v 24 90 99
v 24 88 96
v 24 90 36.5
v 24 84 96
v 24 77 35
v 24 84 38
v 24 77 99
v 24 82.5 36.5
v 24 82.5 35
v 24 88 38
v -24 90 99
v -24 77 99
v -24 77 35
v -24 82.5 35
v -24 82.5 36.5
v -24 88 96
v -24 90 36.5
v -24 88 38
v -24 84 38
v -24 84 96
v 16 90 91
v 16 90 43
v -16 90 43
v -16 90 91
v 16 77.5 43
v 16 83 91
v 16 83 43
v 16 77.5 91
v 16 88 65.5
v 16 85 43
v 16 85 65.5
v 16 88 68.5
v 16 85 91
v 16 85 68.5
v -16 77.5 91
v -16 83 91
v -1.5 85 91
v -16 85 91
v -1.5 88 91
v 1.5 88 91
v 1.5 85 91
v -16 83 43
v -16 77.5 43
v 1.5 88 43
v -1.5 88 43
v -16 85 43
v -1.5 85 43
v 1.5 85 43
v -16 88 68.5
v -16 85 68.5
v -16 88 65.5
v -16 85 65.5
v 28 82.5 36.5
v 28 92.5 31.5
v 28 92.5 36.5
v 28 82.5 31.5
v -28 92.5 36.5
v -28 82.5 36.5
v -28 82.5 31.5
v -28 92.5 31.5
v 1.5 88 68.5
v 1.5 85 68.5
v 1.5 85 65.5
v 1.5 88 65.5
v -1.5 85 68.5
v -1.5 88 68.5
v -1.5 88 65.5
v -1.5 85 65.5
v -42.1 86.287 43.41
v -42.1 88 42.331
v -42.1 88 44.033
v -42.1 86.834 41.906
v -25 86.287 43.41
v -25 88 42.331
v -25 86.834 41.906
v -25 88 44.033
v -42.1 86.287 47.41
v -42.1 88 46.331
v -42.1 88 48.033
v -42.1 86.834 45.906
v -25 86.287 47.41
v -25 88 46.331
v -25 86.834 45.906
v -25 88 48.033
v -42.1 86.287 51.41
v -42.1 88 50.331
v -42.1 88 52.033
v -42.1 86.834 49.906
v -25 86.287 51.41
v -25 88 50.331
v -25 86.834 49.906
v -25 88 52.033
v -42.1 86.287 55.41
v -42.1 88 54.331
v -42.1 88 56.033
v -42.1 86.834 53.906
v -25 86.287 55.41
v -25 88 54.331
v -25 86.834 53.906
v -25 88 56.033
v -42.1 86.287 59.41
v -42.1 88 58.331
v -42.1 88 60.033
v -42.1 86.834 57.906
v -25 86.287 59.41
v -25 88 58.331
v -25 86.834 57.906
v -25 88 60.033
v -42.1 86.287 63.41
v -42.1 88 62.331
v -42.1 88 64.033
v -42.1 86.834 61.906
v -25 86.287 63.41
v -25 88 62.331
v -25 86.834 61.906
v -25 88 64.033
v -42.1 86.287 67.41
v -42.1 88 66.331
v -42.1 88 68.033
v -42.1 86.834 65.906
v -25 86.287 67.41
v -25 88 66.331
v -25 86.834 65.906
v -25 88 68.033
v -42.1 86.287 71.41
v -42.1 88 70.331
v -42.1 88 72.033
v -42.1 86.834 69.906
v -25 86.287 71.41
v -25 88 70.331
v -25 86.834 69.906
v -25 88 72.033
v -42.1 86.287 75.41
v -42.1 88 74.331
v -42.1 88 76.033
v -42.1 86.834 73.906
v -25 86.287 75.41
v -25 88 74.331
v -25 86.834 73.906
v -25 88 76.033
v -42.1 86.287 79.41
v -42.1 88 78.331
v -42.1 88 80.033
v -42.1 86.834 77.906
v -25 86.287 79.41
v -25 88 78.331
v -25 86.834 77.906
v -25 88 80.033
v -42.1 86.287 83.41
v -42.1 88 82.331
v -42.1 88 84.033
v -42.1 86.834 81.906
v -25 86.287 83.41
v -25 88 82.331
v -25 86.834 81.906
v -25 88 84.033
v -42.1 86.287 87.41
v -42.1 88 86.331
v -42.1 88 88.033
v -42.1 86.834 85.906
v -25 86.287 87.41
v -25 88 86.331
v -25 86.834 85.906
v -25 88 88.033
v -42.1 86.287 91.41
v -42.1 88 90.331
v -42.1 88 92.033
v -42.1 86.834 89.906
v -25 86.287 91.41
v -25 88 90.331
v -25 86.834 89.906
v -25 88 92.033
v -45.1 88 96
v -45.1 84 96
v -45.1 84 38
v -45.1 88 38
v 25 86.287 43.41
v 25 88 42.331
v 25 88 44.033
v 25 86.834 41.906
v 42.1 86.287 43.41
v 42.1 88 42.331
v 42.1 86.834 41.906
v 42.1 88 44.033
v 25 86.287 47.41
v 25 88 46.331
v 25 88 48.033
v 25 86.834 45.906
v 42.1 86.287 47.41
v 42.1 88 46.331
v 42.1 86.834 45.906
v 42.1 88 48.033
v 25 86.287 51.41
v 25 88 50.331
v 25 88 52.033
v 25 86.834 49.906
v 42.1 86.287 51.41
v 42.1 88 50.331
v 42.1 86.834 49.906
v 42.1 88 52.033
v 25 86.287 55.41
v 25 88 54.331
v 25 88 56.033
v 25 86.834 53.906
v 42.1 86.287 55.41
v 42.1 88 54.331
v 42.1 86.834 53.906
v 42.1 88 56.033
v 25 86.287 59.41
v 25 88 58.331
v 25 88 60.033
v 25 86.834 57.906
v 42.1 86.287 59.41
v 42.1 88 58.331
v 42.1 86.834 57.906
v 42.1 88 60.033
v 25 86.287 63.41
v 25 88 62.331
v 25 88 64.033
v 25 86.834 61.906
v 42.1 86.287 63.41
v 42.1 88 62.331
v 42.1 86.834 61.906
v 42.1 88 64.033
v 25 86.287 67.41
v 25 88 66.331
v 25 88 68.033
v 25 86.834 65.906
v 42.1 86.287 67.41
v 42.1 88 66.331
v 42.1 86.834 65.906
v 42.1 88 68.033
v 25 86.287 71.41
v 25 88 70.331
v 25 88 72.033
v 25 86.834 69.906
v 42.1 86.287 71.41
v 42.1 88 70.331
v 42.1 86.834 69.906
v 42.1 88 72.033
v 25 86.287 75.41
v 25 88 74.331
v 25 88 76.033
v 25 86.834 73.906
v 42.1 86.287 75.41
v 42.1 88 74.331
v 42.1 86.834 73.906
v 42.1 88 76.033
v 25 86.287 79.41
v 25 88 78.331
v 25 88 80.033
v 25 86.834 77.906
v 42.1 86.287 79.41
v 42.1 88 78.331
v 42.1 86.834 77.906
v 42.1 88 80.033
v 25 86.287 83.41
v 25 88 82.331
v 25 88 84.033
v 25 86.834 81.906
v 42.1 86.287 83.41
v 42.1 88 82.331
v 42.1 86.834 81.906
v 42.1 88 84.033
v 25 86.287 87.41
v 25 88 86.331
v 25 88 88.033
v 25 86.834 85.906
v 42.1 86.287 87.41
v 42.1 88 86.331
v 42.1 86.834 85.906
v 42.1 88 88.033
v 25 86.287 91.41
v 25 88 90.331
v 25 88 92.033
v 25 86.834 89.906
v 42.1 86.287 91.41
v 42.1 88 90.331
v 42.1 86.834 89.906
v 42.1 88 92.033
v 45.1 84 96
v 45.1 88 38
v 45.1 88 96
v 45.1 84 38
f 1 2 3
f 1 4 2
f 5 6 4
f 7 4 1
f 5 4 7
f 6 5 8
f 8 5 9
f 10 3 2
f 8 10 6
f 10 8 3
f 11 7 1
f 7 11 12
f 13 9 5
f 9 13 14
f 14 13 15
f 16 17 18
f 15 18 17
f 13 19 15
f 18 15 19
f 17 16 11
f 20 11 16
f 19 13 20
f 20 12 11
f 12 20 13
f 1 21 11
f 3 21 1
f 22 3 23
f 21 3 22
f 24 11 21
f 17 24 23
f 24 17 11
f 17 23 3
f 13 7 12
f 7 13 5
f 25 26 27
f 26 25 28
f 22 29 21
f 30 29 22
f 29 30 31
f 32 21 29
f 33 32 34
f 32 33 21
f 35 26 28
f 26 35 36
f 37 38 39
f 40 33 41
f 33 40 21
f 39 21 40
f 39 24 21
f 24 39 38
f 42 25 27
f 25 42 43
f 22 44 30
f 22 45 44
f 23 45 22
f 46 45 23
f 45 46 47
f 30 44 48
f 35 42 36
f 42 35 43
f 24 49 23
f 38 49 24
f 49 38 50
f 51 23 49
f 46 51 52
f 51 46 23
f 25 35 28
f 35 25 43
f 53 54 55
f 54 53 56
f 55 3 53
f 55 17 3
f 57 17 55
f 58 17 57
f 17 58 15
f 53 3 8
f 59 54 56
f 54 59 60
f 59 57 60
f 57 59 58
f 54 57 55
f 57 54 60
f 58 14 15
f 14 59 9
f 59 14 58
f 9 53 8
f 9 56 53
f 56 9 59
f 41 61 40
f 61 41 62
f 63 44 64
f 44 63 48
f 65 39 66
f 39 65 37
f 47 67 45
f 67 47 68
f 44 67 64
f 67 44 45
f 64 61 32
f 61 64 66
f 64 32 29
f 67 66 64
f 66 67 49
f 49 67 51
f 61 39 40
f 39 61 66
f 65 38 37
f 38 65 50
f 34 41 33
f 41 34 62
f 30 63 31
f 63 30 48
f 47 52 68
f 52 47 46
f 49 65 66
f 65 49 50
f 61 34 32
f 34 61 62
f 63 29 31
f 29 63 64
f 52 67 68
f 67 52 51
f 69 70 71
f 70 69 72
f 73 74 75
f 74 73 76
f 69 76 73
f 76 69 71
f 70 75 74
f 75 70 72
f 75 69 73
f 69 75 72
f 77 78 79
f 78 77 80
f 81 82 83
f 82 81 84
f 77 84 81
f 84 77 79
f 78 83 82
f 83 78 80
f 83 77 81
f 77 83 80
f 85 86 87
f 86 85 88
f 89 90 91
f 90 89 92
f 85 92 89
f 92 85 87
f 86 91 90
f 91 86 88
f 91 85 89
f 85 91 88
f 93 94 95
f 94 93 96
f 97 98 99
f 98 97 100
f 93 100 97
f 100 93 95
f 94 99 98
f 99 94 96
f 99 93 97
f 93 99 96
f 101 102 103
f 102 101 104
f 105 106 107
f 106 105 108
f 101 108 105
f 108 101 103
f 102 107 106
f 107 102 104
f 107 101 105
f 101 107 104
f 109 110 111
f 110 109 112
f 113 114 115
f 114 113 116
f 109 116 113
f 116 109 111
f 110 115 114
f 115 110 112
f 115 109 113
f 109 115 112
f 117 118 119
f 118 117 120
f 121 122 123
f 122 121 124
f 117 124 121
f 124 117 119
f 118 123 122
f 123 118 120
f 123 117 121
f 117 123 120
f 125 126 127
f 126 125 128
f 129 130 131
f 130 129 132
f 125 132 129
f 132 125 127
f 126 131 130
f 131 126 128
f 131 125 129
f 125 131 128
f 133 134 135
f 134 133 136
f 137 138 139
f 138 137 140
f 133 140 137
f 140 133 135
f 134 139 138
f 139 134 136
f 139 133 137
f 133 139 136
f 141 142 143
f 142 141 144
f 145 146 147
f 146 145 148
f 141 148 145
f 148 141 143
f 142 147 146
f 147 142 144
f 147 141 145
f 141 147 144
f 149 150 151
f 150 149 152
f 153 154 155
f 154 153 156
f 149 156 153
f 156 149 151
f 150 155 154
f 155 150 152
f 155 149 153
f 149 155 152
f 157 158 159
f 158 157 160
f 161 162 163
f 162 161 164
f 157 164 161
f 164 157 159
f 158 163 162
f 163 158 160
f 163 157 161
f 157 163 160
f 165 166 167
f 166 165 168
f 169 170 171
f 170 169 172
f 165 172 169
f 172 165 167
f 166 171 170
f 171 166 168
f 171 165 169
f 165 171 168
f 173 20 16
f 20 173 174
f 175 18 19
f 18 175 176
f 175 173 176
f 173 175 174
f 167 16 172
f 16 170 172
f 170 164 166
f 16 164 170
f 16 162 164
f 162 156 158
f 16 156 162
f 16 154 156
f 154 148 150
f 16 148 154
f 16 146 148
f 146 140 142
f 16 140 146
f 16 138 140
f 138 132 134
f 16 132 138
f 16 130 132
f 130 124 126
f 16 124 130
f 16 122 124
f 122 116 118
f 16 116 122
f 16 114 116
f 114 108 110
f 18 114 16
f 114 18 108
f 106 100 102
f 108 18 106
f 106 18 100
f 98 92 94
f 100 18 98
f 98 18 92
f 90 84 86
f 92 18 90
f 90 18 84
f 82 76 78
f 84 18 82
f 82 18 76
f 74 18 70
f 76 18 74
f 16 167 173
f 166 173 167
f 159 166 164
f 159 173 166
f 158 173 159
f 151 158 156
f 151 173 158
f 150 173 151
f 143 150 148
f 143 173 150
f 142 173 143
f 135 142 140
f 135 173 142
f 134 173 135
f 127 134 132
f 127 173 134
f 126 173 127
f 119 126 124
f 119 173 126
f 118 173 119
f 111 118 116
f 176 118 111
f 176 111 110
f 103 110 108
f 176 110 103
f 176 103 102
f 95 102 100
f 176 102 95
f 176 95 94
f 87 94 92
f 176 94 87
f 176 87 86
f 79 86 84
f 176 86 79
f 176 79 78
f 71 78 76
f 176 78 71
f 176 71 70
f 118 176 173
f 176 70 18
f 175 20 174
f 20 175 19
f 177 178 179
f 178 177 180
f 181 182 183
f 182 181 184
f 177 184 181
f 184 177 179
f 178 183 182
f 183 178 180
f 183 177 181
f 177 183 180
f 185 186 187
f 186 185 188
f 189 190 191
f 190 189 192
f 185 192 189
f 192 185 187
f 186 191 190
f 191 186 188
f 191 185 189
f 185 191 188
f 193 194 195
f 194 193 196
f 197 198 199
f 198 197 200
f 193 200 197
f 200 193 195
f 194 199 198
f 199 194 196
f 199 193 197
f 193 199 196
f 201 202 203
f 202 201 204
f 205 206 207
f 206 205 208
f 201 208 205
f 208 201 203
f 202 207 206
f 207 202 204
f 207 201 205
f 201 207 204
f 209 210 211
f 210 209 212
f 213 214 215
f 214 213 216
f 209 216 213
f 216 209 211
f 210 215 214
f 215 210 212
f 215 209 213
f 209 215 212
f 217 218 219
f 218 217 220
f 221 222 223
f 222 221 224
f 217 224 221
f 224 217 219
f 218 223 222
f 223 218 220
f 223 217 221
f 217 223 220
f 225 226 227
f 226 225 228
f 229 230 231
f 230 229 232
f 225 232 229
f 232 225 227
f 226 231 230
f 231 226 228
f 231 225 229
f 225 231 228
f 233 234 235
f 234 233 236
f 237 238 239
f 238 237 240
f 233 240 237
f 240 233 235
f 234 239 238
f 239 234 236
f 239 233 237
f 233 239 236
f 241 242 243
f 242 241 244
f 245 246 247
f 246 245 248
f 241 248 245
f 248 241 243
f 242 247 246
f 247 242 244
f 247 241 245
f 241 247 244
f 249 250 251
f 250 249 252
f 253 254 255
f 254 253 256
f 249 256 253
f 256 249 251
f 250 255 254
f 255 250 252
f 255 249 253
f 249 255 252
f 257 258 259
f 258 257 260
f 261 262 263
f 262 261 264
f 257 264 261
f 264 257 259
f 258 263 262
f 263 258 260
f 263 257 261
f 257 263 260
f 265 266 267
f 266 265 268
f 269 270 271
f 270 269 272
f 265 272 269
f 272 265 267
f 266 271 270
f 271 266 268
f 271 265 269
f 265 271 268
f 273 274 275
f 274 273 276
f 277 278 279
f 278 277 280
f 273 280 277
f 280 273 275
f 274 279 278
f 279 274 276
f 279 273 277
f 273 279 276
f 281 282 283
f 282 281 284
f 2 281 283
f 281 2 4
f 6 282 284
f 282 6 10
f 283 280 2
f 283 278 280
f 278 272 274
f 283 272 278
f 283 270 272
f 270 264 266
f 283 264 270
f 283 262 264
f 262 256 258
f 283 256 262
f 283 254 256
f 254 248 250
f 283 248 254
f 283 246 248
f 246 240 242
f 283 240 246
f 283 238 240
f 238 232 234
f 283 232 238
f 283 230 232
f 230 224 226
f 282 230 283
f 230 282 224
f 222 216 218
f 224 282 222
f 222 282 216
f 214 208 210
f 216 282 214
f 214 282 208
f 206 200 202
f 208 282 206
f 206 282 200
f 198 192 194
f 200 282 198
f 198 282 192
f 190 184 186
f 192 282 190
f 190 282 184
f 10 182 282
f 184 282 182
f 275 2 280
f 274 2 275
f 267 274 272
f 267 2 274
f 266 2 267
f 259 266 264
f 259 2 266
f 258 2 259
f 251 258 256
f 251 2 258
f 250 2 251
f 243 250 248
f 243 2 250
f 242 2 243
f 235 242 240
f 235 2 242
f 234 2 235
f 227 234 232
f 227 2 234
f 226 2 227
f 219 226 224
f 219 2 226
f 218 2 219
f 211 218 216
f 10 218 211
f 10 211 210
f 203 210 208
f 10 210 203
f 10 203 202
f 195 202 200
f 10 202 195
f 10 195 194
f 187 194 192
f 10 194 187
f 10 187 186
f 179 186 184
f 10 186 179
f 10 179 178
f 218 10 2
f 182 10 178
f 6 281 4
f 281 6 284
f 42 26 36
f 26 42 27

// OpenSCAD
// file: common.scad
// Shared parameters and placement helpers for the dollhouse.
// `include`d by every component file so variables AND helper modules propagate.

$fa = 2;
$fs = 0.5;
eps = 0.1;

// ---- Core house dimensions (mm) ----
house_w = 240;          // width  (X)
house_d = 170;          // depth  (Y)
wall_t  = 8;            // exterior wall thickness
floor_h = 130;          // interior storey height
mid_t   = 8;            // mid-floor slab thickness
wall_height = floor_h * 2 + mid_t;   // 268
half_depth  = house_d / 2;           // 85

// ---- Roof ----
gable_rise = 95;
ridge_z    = wall_height + gable_rise;   // 363
over_x     = 18;        // gable-end overhang
over_y     = 18;        // eave overhang
roof_w     = house_w + 2 * over_x;       // 276
roof_t     = 9;
ridge_r    = 7;
theta      = atan(gable_rise / half_depth);
panel_len  = (half_depth + over_y) / cos(theta);

// ---- Foundation ----
foundation_h    = 18;
foundation_over = 14;

// ---- Windows ----
win_w   = 42;
win_h   = 58;
frame_w = 6;
frame_t_out = 5;        // how far trim/frame protrudes outside
mull_w  = 3;
ground_z = 67;          // window centre, ground floor
upper_z  = 201;         // window centre, upper floor

// ---- Door ----
door_w = 56;
door_h = 104;

// ---- Chimney ----
chimney_w   = 26;
chimney_d   = 22;
chimney_x   = -72;
chimney_y   = 38;
chimney_base_z = 250;
chimney_top = ridge_z + 40;   // 403

// ---- Window / opening placement lists [u, z_centre] ----
front_windows = [[-80, ground_z], [80, ground_z],
                 [-80, upper_z], [0, upper_z], [80, upper_z]];
back_windows  = [[-80, ground_z], [80, ground_z],
                 [-80, upper_z], [80, upper_z]];
side_windows  = [[-40, ground_z], [40, ground_z],
                 [-40, upper_z], [40, upper_z]];

// ---- Colours ----
col_wall    = "#F2E7CE";
col_roof    = "#9B3B2E";
col_trim    = "#FBFBF7";
col_door    = "#3C5A78";
col_found   = "#9A968E";
col_glass   = "#AFC9DE";
col_chimney = "#A14B36";
col_shutter = "#46603F";
col_stair   = "#C8A97E";

// ---- Helpers ----------------------------------------------------------

// Position children flush against a given exterior face, local +Y = outward.
module place_on_face(face, u, z) {
    if (face == "front")
        translate([u, half_depth, z]) children();
    else if (face == "back")
        translate([u, -half_depth, z]) rotate([0, 0, 180]) children();
    else if (face == "left")
        translate([-house_w / 2, u, z]) rotate([0, 0, 90]) children();
    else
        translate([house_w / 2, u, z]) rotate([0, 0, -90]) children();
}

// Solid that pierces a wall to make a window/door opening.
module opening_cut(face, u, z, w, h) {
    if (face == "front")
        translate([u, half_depth - wall_t / 2, z])
            cube([w, wall_t + 4, h], center = true);
    else if (face == "back")
        translate([u, -(half_depth - wall_t / 2), z])
            cube([w, wall_t + 4, h], center = true);
    else if (face == "left")
        translate([-(house_w / 2 - wall_t / 2), u, z])
            cube([wall_t + 4, w, h], center = true);
    else
        translate([house_w / 2 - wall_t / 2, u, z])
            cube([wall_t + 4, w, h], center = true);
}
// main file
include <common.scad>

// A framed double-hung window with sill, mullions, glass and open shutters.
// Modelled on the wall FACE plane: y = 0 is the exterior surface, +Y points
// outward, the wall body occupies y < 0. place_on_face() positions it.
module window() {
    gw = win_w - 2 * frame_w;   // glass width
    gh = win_h - 2 * frame_w;   // glass height

    // Outer trim frame (protrudes outside, laps over the wall edge).
    color(col_trim) {
        difference() {
            translate([0, frame_t_out / 2 - wall_t / 2, 0])
                cube([win_w + 6, frame_t_out + wall_t, win_h + 6], center = true);
            translate([0, 1, 0])
                cube([gw + 2, frame_t_out + wall_t + 4, gh + 2], center = true);
        }
        // Sill
        translate([0, frame_t_out / 2, -win_h / 2 - 4])
            cube([win_w + 14, frame_t_out + 5, 5], center = true);
    }

    // Glass pane, set just inside the trim.
    color(col_glass, 0.55)
        translate([0, -1, 0])
            cube([gw + 2, 2, gh + 2], center = true);

    // Mullions: one vertical, one horizontal cross.
    color(col_trim)
    translate([0, frame_t_out / 2 - 1, 0]) {
        cube([mull_w, 3, gh + 2], center = true);
        cube([gw + 2, 3, mull_w], center = true);
    }

    // Shutters, hinged open flat against the wall on each side.
    sh_w = win_w * 0.55;
    for (s = [-1, 1])
        color(col_shutter)
        translate([s * (win_w / 2 + sh_w / 2 + 1), 1, 0])
            difference() {
                cube([sh_w, 4, win_h], center = true);
                for (k = [-6 : 6])
                    translate([0, 1.5, k * 4])
                        rotate([20, 0, 0])
                            cube([sh_w - 6, 2, 1.6], center = true);
            }
}

translate([0, half_depth, ground_z]) window();
